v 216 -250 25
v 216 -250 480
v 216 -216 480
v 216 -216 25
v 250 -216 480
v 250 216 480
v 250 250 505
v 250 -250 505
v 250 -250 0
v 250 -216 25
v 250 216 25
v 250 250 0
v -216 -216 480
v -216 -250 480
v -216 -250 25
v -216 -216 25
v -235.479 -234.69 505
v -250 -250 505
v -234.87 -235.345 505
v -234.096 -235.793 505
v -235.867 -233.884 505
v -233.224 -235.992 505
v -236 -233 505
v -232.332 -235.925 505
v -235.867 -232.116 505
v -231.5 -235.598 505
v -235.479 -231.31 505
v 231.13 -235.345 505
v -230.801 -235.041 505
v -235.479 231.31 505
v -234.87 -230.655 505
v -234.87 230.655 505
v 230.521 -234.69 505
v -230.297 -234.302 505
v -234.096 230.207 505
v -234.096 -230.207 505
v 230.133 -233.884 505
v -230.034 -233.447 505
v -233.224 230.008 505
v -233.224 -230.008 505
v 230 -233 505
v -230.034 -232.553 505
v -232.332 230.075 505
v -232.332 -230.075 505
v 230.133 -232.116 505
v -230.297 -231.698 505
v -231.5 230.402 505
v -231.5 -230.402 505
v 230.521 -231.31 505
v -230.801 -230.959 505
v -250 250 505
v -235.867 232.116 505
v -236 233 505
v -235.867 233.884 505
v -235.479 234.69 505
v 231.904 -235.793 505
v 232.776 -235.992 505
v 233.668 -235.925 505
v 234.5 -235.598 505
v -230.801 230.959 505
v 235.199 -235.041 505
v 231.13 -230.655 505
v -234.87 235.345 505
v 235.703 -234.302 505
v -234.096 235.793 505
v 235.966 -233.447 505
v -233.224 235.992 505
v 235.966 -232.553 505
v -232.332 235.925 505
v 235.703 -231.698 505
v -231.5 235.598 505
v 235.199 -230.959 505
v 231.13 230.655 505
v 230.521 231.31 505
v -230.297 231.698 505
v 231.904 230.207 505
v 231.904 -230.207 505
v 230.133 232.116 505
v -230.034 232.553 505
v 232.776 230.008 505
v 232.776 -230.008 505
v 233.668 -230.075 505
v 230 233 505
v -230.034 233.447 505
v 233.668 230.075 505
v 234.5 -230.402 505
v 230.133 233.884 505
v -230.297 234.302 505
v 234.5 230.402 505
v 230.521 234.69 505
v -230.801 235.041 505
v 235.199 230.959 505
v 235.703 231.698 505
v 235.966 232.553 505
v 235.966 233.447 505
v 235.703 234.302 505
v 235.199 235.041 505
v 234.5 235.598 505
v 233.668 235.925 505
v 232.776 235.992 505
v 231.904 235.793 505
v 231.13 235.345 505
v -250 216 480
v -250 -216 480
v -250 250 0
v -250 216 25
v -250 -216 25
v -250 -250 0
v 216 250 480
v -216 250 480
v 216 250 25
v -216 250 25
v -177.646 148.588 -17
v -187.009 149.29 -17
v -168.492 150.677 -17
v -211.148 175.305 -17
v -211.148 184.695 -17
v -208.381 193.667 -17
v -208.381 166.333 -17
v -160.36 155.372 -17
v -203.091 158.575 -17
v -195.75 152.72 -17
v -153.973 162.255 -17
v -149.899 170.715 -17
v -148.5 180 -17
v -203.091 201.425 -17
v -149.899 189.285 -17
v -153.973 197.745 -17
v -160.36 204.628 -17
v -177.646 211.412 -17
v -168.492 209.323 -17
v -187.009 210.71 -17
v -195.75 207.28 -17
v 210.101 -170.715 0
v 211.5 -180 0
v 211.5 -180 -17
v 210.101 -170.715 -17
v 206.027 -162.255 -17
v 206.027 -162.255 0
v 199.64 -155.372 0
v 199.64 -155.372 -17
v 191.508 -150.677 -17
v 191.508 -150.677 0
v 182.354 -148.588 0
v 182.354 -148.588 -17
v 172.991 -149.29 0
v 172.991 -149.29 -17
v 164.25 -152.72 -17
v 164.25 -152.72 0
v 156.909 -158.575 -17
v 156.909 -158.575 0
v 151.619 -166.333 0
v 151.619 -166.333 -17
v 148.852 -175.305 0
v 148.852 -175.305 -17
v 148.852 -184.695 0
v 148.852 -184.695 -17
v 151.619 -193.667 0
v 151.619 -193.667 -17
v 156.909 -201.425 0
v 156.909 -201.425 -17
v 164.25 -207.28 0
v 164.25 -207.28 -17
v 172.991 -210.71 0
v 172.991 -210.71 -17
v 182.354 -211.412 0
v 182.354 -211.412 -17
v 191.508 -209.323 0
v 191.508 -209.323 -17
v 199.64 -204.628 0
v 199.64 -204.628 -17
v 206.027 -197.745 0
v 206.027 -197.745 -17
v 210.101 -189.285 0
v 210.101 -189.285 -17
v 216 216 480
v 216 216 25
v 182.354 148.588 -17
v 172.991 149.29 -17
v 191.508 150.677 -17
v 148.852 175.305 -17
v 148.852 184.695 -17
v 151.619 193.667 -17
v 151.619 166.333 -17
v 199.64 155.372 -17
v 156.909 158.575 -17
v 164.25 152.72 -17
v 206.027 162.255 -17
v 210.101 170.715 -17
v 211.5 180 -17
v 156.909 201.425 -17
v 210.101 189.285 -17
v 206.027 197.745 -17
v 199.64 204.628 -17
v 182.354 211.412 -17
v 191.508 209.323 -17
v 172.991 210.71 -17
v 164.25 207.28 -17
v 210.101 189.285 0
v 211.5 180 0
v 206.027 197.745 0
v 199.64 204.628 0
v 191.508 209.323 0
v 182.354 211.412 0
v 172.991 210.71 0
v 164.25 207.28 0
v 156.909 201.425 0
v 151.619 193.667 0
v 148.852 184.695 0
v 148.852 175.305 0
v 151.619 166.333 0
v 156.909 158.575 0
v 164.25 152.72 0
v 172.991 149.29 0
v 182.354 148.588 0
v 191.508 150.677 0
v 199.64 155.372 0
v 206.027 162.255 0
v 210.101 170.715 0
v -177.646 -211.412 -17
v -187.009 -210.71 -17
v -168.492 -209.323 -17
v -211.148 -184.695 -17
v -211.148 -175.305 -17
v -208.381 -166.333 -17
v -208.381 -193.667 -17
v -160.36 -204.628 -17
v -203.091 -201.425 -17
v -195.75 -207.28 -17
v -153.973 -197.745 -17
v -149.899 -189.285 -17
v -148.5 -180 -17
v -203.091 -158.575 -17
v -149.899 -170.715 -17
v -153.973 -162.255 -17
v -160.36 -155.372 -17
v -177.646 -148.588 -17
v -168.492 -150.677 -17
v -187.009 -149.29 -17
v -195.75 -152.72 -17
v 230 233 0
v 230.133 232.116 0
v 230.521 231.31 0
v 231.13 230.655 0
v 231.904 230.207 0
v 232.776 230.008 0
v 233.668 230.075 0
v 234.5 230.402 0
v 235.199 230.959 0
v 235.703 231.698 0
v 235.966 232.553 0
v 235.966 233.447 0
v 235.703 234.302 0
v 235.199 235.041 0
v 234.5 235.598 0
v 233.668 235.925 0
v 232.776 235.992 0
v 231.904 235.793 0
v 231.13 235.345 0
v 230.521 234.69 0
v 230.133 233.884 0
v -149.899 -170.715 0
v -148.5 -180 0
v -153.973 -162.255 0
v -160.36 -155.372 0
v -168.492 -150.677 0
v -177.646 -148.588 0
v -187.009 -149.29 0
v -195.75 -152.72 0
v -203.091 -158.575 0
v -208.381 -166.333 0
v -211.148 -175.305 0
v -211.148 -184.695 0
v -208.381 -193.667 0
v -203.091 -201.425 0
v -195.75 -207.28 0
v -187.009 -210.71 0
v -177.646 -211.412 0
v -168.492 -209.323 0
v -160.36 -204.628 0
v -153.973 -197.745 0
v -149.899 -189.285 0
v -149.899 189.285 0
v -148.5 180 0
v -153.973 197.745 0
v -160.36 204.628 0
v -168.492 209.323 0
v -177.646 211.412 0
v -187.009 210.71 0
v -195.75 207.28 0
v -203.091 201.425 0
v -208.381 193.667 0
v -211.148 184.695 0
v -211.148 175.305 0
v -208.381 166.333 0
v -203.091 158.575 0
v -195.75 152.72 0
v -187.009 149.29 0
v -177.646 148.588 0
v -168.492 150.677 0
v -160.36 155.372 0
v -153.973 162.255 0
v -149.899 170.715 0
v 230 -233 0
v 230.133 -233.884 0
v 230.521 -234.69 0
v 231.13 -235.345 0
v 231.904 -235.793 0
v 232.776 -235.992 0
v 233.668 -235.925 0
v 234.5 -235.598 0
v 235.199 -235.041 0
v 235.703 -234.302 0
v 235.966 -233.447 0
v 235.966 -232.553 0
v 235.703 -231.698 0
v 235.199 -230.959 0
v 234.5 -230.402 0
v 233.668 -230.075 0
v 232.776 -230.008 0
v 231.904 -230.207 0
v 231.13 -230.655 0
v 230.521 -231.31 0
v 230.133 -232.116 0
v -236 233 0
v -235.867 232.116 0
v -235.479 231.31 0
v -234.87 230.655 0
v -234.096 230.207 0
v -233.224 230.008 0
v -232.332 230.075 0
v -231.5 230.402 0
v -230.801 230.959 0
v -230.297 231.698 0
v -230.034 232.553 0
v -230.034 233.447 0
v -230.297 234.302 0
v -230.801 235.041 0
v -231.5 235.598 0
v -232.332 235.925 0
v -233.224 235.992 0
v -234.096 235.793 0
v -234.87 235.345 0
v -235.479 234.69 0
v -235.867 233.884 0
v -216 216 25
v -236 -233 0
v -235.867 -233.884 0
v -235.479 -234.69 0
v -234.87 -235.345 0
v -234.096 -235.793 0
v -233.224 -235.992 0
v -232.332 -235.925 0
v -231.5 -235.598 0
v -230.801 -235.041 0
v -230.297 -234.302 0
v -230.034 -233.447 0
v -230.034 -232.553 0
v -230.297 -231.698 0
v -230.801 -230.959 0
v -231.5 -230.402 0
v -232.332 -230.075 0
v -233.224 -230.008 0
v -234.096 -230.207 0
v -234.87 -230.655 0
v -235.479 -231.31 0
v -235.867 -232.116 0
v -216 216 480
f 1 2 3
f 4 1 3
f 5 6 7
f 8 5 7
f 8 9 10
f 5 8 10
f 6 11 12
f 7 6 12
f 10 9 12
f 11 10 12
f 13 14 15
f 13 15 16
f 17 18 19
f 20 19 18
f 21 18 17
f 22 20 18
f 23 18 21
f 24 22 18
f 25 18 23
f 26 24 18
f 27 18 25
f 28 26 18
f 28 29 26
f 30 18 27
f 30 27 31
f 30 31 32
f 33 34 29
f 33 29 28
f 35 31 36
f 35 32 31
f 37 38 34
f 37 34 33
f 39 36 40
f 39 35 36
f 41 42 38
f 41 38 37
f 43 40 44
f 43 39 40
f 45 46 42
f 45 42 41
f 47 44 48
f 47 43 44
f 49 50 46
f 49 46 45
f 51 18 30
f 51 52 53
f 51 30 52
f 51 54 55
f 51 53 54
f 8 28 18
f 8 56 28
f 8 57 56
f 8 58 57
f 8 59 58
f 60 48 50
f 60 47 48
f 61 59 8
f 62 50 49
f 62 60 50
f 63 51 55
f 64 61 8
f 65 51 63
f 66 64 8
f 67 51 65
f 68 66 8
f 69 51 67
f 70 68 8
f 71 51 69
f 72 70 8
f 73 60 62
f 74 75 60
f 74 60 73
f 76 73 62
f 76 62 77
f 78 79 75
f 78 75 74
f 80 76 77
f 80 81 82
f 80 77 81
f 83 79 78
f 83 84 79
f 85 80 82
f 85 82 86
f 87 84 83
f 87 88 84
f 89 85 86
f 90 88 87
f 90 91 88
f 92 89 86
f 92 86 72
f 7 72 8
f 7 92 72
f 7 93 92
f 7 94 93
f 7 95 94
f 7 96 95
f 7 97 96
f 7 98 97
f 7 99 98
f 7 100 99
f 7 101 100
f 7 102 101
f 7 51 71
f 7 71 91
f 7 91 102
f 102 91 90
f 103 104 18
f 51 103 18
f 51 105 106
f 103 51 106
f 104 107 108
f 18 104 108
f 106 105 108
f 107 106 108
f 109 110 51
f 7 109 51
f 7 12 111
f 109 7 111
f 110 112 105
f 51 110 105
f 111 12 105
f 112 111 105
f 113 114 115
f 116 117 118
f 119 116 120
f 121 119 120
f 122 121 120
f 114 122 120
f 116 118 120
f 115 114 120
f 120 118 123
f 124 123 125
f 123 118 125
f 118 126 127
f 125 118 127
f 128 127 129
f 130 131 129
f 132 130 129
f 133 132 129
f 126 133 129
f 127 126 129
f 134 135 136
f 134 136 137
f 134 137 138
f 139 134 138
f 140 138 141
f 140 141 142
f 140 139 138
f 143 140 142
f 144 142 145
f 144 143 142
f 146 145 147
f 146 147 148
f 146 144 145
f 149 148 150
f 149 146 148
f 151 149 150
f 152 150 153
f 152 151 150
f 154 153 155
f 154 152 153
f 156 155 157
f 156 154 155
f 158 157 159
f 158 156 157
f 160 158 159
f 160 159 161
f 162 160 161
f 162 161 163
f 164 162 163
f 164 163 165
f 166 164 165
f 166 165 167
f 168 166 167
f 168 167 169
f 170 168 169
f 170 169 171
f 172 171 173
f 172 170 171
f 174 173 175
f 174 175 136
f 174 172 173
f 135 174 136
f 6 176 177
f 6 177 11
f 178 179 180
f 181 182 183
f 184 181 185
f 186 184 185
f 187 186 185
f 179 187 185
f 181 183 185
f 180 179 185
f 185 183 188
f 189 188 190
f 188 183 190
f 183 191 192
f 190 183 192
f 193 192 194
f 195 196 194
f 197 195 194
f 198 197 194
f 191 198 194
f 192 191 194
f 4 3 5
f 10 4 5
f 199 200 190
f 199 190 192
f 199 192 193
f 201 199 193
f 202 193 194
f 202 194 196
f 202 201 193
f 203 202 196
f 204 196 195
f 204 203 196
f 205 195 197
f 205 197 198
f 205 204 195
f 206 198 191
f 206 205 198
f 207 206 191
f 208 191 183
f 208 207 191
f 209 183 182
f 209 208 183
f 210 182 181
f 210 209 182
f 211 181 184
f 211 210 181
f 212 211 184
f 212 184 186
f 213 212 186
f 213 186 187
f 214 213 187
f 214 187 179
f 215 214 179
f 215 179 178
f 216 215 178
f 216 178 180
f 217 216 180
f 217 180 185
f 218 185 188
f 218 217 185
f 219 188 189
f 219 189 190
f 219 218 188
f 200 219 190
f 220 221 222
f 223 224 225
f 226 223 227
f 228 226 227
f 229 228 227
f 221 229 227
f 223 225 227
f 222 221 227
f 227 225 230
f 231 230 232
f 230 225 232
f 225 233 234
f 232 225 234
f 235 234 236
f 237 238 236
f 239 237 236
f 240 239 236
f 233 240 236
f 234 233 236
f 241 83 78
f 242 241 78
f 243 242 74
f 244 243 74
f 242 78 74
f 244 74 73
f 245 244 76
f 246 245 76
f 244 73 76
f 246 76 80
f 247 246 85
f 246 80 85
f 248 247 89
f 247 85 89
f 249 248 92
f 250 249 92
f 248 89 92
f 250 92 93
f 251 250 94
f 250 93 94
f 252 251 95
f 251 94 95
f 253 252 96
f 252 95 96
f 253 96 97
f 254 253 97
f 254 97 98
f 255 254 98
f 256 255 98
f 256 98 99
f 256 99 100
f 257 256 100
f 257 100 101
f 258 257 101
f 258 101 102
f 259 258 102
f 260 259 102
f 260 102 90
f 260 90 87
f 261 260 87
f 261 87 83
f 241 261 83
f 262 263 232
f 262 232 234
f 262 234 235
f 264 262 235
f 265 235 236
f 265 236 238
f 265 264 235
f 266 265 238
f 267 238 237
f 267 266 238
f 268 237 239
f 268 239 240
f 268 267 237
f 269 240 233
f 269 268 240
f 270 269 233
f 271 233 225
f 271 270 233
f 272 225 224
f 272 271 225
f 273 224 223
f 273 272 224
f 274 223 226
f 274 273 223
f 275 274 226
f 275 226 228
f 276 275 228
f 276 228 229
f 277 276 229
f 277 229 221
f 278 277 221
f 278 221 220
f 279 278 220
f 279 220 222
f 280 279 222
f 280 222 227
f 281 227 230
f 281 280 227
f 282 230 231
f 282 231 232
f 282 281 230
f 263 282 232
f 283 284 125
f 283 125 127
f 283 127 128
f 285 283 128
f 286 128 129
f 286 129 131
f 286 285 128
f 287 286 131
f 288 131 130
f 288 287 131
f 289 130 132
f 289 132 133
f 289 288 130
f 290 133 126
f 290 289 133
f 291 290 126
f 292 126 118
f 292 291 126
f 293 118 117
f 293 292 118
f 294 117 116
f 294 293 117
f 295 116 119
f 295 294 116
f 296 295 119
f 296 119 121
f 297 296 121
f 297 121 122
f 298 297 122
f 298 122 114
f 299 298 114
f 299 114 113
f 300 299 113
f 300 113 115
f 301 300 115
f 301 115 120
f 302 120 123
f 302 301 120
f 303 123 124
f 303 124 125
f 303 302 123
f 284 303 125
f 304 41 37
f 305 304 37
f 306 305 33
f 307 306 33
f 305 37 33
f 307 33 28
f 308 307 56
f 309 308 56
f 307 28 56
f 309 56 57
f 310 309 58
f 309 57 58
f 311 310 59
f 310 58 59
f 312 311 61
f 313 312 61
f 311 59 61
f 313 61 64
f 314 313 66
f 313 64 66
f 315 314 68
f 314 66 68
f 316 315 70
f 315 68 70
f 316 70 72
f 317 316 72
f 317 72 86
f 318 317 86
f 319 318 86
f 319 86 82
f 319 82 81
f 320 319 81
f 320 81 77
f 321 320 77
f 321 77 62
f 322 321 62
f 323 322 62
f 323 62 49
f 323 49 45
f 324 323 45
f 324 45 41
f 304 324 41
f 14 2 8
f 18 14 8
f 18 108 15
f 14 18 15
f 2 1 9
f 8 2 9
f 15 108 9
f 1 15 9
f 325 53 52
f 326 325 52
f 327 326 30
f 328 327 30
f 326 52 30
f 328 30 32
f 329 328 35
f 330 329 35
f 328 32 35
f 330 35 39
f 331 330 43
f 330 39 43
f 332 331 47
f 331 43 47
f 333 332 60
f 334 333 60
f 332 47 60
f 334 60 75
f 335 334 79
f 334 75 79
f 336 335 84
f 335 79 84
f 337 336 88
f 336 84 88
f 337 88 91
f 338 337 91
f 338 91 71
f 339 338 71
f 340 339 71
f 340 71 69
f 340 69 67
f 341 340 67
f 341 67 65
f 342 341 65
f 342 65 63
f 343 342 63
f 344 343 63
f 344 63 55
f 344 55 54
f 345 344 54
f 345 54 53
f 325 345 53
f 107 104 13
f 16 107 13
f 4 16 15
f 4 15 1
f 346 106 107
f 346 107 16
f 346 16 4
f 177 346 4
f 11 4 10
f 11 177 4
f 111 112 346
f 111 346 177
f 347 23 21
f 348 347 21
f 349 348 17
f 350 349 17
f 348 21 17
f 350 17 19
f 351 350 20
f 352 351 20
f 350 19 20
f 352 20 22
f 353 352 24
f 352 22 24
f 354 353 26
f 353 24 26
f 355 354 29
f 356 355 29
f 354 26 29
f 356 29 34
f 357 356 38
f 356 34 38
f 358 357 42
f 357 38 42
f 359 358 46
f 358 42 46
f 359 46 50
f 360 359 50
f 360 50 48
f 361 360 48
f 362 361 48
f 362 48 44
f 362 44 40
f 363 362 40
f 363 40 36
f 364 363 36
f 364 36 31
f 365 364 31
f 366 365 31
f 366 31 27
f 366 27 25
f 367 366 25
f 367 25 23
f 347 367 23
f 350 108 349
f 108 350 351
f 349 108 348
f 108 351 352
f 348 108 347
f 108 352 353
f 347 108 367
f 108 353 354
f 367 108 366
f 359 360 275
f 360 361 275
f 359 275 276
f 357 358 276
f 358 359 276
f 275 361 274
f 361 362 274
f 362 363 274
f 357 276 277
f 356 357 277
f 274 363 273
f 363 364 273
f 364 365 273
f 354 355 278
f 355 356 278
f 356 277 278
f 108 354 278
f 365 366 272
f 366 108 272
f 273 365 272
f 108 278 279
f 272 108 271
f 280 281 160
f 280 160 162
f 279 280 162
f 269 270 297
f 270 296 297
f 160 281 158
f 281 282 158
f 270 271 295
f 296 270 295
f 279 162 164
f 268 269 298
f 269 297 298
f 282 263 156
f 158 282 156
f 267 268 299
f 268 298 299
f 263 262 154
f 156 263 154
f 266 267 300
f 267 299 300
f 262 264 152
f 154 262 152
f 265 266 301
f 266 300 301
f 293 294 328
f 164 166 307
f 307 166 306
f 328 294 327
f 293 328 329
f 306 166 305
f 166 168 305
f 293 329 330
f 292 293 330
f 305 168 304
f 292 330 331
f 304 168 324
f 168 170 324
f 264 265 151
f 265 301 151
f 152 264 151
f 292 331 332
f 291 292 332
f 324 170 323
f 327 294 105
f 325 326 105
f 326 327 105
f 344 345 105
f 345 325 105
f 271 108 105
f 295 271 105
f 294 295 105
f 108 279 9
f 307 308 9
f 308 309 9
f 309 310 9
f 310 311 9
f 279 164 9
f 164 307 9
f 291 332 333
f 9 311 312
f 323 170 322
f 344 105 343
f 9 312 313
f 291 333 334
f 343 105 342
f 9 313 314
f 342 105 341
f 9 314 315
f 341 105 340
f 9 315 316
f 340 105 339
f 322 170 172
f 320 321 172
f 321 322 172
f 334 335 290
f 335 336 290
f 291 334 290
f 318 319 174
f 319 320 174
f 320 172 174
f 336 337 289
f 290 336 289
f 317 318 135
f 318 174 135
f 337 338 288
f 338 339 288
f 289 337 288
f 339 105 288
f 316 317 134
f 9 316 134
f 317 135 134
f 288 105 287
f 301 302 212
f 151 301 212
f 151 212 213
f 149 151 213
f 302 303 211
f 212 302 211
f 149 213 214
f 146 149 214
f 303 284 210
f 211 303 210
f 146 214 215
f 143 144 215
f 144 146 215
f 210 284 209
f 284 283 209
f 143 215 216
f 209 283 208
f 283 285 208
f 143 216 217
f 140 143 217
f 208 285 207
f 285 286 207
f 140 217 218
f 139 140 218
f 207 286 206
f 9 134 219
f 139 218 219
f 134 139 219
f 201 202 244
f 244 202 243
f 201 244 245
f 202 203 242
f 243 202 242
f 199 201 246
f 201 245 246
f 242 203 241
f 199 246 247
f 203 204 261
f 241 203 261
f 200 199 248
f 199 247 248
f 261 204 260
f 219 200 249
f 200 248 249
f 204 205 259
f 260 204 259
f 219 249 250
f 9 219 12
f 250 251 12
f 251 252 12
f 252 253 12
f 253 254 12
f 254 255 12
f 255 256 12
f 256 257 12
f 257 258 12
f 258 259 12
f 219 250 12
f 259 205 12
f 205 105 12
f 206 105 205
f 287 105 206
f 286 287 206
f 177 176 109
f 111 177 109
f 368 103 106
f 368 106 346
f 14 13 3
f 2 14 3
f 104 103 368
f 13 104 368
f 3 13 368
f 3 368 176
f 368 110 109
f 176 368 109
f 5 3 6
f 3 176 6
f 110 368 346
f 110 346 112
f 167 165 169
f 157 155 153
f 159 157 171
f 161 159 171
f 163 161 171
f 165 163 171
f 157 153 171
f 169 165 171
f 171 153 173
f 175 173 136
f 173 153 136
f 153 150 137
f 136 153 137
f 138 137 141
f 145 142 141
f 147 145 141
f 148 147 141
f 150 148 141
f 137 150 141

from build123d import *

# Parameters (mm, degrees)
F0_W     = 500
F0_H     = 500
F0_R     = 31.5
F1_DEPTH = 25
F2_W     = 34
F2_H     = 34
F3_DEPTH = 455
F4_W     = 34
F4_H     = 34
F5_DEPTH = 25
F6_DEPTH = 17
F7_D     = 6


with BuildPart() as f1:
    # F0 (on Top) → F1 (new body)
    with BuildSketch(Plane.XY):
        Rectangle(F0_W, F0_H)
        with Locations((-180, -180)):
            Circle(F0_R, mode=Mode.SUBTRACT)
        with Locations((180, -180)):
            Circle(F0_R, mode=Mode.SUBTRACT)
        with Locations((-180, 180)):
            Circle(F0_R, mode=Mode.SUBTRACT)
        with Locations((180, 180)):
            Circle(F0_R, mode=Mode.SUBTRACT)
        with Locations((-180, -180)):
            Circle(F0_R)
        with Locations((180, -180)):
            Circle(F0_R)
        with Locations((-180, 180)):
            Circle(F0_R)
        with Locations((180, 180)):
            Circle(F0_R)
    extrude(amount=F1_DEPTH)

    # F2 (on face) → F3 (join)
    with BuildSketch(Plane.XY.offset(25)):
        with Locations((-233, 233)):
            Rectangle(F2_W, F2_H)
        with Locations((233, 233)):
            Rectangle(F2_W, F2_H)
        with Locations((233, -233)):
            Rectangle(F2_W, F2_H)
        with Locations((-233, -233)):
            Rectangle(F2_W, F2_H)
    extrude(amount=F3_DEPTH)

    # F4 (on face) → F5 (join)
    with BuildSketch(Plane.XY.offset(480)):
        Polygon((-250, -250), (250, -250), (250, 250), (-216, 250), (-216, 216), (-250, 216), align=None)
        with Locations((-233, 233)):
            Rectangle(F4_W, F4_H)
    extrude(amount=F5_DEPTH)

    # F0 (on Top) → F6 (join)
    with BuildSketch(Plane.XY):
        with Locations((-180, -180)):
            Circle(F0_R)
        with Locations((-180, 180)):
            Circle(F0_R)
        with Locations((180, 180)):
            Circle(F0_R)
        with Locations((180, -180)):
            Circle(F0_R)
    extrude(amount=-F6_DEPTH)

    # F7 (through all)
    with Locations(Plane(origin=(0, 0, 0), x_dir=(1, 0, 0), z_dir=(0, 0, -1))):
        with Locations((-233, -233), (233, -233), (233, 233), (-233, 233)):
            Hole(F7_D / 2)


solid = f1.part
